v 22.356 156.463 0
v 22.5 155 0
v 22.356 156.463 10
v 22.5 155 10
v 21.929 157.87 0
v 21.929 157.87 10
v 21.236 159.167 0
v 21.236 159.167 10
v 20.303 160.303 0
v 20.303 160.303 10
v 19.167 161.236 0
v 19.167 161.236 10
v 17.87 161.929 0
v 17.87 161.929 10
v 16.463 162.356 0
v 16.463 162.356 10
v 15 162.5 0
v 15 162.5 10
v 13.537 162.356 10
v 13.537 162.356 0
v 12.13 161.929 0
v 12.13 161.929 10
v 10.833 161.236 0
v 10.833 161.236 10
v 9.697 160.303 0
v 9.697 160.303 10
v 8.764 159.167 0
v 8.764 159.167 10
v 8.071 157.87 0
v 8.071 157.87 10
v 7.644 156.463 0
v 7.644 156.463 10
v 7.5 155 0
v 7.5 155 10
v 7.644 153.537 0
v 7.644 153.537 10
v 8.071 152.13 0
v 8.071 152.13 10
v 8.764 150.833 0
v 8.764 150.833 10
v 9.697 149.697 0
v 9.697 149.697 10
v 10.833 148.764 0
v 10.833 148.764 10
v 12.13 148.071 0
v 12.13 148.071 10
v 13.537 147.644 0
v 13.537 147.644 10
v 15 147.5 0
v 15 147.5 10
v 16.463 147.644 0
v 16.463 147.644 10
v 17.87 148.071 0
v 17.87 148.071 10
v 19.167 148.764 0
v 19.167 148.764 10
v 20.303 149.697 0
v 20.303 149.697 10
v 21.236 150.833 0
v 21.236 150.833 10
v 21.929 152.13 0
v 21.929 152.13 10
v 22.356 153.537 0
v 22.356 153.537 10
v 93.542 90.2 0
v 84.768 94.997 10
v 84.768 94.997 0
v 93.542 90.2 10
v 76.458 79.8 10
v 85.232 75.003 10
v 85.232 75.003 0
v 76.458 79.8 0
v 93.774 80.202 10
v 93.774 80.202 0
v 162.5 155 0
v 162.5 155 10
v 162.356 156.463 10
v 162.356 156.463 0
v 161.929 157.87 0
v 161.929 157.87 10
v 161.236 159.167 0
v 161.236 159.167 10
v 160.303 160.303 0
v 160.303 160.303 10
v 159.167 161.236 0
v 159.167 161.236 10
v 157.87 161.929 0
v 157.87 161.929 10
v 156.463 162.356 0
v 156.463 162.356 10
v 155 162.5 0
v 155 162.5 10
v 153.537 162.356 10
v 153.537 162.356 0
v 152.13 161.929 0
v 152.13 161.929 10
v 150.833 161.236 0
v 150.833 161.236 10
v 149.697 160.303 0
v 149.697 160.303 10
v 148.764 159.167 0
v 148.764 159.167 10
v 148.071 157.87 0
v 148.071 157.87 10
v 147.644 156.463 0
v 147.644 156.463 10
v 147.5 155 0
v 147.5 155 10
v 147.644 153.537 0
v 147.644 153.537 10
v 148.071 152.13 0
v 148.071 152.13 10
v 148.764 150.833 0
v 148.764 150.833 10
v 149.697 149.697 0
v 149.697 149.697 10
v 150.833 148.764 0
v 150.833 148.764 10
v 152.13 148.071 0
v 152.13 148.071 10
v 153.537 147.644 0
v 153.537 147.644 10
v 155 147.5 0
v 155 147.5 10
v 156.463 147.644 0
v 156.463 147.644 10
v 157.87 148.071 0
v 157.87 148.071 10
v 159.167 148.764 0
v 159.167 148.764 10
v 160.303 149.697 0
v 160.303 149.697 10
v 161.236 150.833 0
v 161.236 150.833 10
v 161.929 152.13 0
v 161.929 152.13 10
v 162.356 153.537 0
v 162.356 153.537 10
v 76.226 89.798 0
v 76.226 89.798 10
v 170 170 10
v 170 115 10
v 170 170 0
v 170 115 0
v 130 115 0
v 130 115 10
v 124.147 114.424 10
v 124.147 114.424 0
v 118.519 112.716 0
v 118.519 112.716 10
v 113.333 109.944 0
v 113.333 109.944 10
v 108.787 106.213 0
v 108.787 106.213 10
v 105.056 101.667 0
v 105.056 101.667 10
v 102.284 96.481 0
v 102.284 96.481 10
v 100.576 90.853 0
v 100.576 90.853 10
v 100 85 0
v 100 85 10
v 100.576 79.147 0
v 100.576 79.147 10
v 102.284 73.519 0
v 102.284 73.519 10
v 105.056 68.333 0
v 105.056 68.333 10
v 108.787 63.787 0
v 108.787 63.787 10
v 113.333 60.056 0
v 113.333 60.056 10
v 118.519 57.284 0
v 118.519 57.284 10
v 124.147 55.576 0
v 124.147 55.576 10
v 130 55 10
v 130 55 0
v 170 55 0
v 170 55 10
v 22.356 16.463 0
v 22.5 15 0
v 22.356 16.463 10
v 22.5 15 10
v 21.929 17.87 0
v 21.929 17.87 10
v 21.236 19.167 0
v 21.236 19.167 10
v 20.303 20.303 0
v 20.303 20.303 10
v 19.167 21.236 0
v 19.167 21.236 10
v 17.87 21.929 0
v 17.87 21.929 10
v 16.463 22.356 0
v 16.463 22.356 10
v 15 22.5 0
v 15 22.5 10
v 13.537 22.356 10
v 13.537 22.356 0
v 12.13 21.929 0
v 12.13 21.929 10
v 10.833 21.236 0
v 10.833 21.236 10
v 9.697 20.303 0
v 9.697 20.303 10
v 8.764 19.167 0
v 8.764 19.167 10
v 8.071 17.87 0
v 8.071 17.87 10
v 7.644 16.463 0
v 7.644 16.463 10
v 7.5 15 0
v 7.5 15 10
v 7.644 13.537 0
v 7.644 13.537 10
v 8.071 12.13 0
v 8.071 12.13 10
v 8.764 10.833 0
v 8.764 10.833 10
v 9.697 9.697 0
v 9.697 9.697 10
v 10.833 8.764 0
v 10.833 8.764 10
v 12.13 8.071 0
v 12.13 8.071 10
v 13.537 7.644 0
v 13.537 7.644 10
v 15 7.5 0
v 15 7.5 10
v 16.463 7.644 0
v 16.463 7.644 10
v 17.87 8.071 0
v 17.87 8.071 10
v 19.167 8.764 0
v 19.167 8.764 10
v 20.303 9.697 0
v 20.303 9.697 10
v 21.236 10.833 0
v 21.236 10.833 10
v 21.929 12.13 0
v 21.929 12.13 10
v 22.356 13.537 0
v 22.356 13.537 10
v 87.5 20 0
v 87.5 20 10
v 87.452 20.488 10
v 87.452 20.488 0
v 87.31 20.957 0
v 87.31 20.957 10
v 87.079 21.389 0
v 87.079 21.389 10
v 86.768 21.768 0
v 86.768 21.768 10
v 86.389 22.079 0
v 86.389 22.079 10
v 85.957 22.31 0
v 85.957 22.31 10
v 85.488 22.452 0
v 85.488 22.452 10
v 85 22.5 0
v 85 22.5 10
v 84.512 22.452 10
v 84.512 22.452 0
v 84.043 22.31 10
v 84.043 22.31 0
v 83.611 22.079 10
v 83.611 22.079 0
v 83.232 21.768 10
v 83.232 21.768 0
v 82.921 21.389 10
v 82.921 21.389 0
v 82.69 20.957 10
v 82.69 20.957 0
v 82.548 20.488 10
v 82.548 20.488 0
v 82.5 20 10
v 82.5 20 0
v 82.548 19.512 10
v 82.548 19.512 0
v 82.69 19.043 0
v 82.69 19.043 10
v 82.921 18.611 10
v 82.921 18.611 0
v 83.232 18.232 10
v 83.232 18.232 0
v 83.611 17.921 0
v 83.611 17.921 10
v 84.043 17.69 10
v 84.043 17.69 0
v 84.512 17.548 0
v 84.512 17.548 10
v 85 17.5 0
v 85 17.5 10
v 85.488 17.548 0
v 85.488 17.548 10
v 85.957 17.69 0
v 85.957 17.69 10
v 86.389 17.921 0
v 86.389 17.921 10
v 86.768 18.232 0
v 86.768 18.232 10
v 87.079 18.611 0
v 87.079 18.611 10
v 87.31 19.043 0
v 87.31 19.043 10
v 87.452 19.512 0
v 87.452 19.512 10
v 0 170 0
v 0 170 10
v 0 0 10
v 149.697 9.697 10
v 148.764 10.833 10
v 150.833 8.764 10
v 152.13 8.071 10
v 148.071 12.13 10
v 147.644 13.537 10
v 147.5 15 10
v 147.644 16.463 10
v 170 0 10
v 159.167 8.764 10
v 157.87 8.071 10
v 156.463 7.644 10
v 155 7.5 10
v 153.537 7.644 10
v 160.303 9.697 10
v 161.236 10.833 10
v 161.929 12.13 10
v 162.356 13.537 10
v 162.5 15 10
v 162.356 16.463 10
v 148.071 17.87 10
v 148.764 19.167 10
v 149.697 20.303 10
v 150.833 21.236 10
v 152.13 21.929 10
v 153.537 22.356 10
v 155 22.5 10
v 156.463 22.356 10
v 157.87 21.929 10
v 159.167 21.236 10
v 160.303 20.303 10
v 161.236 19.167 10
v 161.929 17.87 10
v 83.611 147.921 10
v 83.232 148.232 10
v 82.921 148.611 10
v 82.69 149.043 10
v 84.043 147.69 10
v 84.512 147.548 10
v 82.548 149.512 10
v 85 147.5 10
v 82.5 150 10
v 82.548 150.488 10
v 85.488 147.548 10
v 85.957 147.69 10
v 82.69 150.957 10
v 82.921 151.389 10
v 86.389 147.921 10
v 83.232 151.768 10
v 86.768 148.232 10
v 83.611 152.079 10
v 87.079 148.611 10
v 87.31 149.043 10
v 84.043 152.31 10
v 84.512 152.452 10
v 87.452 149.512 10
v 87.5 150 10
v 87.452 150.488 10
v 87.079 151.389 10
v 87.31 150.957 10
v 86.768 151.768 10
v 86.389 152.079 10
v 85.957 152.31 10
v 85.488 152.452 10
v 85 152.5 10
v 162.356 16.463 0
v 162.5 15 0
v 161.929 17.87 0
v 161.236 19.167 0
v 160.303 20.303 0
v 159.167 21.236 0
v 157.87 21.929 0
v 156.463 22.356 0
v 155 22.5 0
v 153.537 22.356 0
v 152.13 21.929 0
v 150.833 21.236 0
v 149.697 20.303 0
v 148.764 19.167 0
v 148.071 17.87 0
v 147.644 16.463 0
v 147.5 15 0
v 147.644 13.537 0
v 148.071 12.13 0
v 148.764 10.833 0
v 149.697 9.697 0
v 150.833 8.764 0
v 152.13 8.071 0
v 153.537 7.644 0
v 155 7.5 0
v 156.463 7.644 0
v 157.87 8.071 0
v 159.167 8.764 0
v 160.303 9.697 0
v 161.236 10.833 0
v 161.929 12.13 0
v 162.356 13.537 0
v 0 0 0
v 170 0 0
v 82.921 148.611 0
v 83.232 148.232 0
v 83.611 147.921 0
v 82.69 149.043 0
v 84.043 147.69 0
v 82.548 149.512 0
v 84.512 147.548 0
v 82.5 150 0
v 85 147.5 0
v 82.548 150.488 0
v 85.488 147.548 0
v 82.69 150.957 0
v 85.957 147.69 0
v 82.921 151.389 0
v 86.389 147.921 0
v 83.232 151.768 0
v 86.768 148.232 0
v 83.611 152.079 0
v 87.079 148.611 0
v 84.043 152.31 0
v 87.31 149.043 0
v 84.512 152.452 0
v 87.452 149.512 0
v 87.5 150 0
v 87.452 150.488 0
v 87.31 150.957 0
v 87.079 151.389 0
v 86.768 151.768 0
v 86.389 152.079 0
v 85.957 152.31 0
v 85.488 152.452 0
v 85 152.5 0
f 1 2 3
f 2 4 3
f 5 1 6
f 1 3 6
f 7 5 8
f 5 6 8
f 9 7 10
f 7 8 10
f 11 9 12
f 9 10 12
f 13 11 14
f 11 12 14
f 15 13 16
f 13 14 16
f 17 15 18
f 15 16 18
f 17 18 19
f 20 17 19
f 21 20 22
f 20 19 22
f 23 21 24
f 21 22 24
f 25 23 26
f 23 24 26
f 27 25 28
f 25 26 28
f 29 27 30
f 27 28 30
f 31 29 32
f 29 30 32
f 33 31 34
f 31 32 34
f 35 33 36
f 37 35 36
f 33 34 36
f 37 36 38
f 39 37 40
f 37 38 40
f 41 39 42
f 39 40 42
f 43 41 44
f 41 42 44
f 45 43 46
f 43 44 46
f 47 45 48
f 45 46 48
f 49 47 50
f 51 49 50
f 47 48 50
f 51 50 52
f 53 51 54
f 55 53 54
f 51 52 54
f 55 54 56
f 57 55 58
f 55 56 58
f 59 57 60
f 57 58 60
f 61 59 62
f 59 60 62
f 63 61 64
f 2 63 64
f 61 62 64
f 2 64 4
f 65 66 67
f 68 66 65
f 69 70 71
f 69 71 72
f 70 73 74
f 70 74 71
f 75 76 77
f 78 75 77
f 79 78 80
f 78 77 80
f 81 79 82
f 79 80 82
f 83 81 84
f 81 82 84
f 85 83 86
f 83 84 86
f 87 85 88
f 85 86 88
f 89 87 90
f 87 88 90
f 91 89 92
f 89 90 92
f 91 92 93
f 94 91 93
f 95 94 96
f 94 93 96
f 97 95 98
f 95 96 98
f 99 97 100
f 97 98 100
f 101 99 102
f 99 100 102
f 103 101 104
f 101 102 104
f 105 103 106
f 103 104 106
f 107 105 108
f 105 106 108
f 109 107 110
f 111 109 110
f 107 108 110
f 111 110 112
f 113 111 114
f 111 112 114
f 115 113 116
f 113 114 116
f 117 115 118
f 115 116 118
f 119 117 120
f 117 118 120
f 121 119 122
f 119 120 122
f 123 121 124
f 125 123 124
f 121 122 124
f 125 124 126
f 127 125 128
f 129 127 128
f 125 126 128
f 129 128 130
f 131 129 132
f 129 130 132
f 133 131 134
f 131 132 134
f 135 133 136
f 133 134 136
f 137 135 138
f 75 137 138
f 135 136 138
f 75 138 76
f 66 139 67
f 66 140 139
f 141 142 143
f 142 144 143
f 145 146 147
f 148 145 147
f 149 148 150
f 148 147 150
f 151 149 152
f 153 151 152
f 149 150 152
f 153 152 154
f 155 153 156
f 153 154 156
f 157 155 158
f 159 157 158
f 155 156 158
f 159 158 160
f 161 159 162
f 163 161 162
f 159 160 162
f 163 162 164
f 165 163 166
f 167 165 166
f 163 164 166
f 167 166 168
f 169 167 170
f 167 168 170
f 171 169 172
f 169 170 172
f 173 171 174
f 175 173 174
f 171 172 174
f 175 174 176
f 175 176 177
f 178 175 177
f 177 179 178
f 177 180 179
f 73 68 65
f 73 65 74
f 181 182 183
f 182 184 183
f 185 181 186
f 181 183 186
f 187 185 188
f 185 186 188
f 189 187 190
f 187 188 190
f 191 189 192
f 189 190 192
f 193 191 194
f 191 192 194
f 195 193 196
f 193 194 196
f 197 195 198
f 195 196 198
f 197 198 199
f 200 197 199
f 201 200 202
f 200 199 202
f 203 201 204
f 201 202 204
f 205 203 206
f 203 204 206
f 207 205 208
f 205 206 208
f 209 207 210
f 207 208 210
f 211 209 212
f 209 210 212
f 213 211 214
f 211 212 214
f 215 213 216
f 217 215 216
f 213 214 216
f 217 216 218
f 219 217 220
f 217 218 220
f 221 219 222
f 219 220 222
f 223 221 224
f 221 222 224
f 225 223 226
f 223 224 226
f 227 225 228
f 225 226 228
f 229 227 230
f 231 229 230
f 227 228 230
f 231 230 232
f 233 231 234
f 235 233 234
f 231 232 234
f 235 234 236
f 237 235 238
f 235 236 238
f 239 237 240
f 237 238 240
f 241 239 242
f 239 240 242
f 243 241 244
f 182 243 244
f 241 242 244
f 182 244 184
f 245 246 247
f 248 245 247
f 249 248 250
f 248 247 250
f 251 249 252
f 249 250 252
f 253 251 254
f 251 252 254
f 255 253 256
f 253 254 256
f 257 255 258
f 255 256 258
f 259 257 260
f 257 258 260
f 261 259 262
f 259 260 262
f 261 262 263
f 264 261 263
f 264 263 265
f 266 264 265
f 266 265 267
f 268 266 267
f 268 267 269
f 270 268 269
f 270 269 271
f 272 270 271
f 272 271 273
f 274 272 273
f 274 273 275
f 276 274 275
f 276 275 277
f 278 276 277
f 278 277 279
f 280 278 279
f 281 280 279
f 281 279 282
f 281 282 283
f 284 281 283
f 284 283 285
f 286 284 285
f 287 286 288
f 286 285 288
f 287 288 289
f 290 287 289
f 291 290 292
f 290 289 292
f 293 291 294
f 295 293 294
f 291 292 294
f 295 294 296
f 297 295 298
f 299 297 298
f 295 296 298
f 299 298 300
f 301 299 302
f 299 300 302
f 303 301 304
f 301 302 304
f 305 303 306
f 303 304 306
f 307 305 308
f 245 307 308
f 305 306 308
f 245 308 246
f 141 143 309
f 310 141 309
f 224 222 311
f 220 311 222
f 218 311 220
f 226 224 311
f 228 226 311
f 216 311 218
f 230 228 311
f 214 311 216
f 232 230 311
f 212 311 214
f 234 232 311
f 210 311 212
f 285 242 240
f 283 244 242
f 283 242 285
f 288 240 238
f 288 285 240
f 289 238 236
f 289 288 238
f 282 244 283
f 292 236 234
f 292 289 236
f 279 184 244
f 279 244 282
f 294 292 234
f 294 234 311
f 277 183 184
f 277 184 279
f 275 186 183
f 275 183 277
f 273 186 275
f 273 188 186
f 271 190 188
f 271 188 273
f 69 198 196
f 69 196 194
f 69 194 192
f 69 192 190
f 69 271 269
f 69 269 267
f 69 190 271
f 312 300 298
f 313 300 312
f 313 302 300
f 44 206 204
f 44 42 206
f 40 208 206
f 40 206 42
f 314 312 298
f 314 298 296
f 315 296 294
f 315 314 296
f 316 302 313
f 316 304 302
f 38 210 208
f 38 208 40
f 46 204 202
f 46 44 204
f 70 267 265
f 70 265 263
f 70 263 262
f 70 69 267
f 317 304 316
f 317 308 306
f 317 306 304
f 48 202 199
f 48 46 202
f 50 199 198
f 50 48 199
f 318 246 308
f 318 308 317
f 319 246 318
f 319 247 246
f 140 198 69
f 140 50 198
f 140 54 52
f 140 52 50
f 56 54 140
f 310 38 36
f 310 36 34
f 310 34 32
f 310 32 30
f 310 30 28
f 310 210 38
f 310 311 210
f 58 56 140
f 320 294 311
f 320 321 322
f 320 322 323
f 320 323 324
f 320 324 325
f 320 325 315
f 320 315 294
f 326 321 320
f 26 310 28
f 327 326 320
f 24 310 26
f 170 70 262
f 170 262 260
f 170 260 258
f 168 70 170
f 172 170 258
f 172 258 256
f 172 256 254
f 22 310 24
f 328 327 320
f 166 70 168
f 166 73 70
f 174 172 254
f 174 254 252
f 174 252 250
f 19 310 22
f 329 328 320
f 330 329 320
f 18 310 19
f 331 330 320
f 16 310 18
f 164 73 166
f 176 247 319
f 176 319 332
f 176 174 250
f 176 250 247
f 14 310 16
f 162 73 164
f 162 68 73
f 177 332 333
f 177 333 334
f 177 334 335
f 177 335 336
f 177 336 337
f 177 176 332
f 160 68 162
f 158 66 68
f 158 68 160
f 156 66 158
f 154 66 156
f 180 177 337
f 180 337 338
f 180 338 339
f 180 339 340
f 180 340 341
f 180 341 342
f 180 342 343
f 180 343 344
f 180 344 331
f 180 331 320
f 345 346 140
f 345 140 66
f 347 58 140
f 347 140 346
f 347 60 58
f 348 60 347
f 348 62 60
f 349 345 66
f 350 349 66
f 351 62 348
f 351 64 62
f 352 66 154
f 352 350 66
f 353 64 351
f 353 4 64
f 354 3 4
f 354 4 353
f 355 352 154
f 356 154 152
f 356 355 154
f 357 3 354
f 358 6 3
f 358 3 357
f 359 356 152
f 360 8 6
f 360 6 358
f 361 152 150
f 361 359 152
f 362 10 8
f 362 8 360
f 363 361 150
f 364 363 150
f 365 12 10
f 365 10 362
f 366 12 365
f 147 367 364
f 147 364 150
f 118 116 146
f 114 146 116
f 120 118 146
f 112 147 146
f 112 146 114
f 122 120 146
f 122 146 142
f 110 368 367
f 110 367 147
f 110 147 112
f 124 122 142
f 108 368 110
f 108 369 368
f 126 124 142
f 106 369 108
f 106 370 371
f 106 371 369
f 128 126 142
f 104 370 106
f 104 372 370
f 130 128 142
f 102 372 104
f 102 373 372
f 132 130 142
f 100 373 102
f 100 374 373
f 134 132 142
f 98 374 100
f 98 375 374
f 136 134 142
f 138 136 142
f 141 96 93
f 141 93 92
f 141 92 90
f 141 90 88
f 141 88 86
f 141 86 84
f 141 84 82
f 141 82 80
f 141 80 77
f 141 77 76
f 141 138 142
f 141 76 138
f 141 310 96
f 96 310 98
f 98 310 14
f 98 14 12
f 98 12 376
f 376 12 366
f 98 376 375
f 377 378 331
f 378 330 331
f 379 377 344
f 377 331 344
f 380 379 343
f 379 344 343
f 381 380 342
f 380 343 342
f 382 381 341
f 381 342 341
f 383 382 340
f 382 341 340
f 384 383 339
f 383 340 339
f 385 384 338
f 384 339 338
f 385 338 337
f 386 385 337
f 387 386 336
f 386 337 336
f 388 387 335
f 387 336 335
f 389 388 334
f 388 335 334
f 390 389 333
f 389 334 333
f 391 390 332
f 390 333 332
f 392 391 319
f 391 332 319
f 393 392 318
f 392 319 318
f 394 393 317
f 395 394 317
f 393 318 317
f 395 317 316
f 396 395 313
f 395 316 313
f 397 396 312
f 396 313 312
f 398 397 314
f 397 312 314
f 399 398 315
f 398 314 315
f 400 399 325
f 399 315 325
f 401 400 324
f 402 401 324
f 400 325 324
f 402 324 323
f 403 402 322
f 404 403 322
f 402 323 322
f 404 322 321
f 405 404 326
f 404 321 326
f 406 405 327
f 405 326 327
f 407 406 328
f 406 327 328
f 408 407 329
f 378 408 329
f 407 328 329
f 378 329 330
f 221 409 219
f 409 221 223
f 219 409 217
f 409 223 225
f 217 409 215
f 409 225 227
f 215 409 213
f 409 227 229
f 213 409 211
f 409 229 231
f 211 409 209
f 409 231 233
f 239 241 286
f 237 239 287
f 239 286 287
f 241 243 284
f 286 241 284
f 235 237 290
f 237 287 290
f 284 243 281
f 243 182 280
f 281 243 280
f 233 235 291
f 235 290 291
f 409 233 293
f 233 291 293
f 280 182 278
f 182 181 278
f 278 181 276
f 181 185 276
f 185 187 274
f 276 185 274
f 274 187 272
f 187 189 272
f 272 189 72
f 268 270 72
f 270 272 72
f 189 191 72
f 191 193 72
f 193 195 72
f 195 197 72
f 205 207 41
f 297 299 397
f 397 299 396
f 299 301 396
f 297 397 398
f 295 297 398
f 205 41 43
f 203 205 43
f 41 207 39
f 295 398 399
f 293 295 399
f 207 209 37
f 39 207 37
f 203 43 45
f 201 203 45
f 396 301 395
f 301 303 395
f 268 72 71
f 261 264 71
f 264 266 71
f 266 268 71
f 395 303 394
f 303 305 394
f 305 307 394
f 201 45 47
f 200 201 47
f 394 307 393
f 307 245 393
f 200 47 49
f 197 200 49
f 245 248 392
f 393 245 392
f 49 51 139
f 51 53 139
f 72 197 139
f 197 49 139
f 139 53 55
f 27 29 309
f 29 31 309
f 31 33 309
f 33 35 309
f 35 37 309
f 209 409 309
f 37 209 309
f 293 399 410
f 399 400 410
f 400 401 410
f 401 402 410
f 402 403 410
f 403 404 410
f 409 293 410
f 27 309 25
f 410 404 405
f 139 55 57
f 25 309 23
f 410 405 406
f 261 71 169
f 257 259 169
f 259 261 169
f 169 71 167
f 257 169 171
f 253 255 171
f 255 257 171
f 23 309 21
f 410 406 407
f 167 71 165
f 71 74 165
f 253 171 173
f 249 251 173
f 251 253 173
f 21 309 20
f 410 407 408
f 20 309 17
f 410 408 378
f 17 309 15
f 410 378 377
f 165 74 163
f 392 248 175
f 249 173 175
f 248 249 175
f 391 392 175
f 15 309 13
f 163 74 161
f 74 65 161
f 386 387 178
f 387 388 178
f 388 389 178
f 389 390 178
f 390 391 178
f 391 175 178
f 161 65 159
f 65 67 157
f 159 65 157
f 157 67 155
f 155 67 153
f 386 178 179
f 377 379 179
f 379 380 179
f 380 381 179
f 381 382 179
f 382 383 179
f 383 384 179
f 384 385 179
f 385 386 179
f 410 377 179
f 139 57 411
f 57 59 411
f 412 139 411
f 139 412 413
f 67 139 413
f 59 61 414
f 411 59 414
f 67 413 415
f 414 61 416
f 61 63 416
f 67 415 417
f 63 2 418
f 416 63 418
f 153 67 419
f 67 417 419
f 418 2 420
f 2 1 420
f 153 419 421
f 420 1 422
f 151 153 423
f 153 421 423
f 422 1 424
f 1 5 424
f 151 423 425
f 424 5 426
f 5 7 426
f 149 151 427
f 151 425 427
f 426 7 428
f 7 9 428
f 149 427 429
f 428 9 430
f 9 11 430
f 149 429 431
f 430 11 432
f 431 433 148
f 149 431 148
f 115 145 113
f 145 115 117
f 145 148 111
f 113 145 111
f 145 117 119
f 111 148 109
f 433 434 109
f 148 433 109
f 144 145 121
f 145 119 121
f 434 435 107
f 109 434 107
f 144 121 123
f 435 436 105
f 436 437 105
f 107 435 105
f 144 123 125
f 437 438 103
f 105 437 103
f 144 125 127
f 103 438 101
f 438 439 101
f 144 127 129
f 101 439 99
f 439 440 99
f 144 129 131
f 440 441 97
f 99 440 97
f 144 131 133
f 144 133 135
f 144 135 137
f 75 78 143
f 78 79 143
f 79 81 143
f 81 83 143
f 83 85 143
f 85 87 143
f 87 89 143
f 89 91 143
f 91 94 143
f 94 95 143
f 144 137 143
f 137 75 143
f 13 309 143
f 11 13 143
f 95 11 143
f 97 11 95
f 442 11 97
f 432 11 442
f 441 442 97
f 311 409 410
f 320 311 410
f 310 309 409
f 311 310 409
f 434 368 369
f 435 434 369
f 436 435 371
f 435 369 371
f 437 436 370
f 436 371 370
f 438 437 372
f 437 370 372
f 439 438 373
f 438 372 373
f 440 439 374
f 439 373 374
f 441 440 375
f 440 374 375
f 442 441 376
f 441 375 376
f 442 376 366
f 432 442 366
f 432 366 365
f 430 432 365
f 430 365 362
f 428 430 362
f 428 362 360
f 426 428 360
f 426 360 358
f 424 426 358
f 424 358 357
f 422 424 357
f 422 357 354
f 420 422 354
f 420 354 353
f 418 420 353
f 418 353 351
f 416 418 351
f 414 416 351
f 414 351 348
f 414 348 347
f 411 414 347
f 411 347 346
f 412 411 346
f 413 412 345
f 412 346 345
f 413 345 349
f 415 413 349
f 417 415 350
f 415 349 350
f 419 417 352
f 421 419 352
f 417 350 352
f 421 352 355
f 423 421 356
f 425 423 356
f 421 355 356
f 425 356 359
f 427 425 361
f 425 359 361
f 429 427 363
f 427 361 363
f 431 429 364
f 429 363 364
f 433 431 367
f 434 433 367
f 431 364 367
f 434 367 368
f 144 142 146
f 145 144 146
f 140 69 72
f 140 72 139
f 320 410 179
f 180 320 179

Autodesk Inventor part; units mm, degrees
ref_plane "YZ Plane" through (0, 0, 0) normal (1, 0, 0) x (0, 1, 0)
ref_plane "XZ Plane" through (0, 0, 0) normal (0, 1, 0) x (-1, 0, 0)
ref_plane "XY Plane" through (0, 0, 0) normal (0, 0, 1) x (1, 0, 0)
sketch "Sketch1" plane through (0, 0, 0) normal (0, 0, 1) x (1, 0, 0)
  line L0 (0, 0) -> (170, 0)
  line L1 (170, 0) -> (170, 170)
  line L2 (170, 170) -> (0, 170)
  line L3 (0, 170) -> (0, 0)
  dimension "d0" = 170
  dimension "d1" = 170
extrude "Extrusion1" add sketch "Sketch1" along normal blind 10
sketch "Sketch2" plane through (0, 0, 10) normal (0, 0, 1) x (1, 0, 0)
  line L0 (170, 170) -> (0, 170) projected
  line L1 (0, 170) -> (0, 155)
  line L2 (0, 170) -> (0, 0) projected
  line L3 (0, 0) -> (170, 0) projected
  line L4 (0, 0) -> (0, 15)
  line L5 (0, 15) -> (155, 15)
  line L6 (155, 15) -> (155, 155)
  line L7 (155, 155) -> (15, 155)
  line L8 (15, 155) -> (15, 15)
  line L9 (15, 155) -> (30, 155)
  circle A0 centre (15, 155) radius 7.5
  circle A1 centre (155, 155) radius 7.5
  circle A2 centre (155, 15) radius 7.5
  circle A3 centre (15, 15) radius 7.5
  dimension "d4" = 15
  dimension "d5" = 15
  dimension "d6" = 155
  dimension "d7" = 140
  dimension "d8" = 140
  dimension "d9" = 140
  dimension "d10" = 15
  dimension "d11" = 15
  dimension "d12" = 15
  dimension "d13" = 15
extrude "Extrusion2" cut sketch "Sketch2" against normal blind 10 contours L8 A3 L5 | L5 A3 | L5 A3 L8 | A2 L6 L5 | L5 L6 A2 | A0 L7 L8 | L8 L7 A0 | A1 L7 L6 | L6 L7 A1
sketch "Sketch3" plane through (0, 0, 10) normal (0, 0, 1) x (1, 0, 0)
  line L0 (170, 170) -> (0, 170) projected
  line L1 (0, 170) -> (85, 170)
  line L2 (85, 170) -> (85, 85)
  line L3 (93.542, 90.1995) -> (93.7739, 80.2022)
  line L4 (93.7739, 80.2022) -> (85.2319, 75.0027)
  line L5 (85.2319, 75.0027) -> (76.458, 79.8005)
  line L6 (76.458, 79.8005) -> (76.2261, 89.7978)
  line L7 (76.2261, 89.7978) -> (84.7681, 94.9973)
  line L8 (84.7681, 94.9973) -> (93.542, 90.1995)
  point P0 (0, 0)
  dimension "d16" = 85
  dimension "d17" = 85
  dimension "d18" = 10
extrude "Extrusion3" cut sketch "Sketch3" against normal blind 10
sketch "Sketch4" plane through (0, 0, 10) normal (0, 0, 1) x (1, 0, 0)
  line L0 (170, 170) -> (0, 170) projected
  line L1 (0, 170) -> (85, 170)
  line L2 (85, 170) -> (85, 150)
  line L3 (85, 150) -> (85, 20)
  circle A0 centre (85, 150) radius 2.5
  circle A1 centre (85, 20) radius 2.5
  point P0 (0, 0)
  dimension "d21" = 85
  dimension "d22" = 20
  dimension "d23" = 130
  dimension "d24" = 5
  dimension "d25" = 5
extrude "Extrusion4" cut sketch "Sketch4" against normal blind 10
sketch "Sketch5" plane through (0, 0, 10) normal (0, 0, 1) x (1, 0, 0)
  line L0 (170, 170) -> (0, 170) projected
  line L1 (170, 170) -> (170, 85)
  line L2 (170, 0) -> (170, 170) projected
  point P0 (0, 0)
  dimension "d28" = 85
sketch "Sketch6" plane through (0, 0, 10) normal (0, 0, 1) x (1, 0, 0)
  line L0 (170, 0) -> (170, 170) projected
  line L1 (170, 85) -> (130, 85)
  circle A0 centre (130, 85) radius 30
  point P0 (0, 0)
  dimension "d29" = 40
  dimension "d30" = 60
extrude "Extrusion5" cut sketch "Sketch6" against normal blind 10
sketch "Sketch7" plane through (0, 0, 10) normal (0, 0, 1) x (1, 0, 0)
  line L0 (170, 0) -> (170, 170) projected
  line L1 (170, 85) -> (170, 55)
  line L2 (170, 55) -> (170, 115)
  line L3 (170, 115) -> (157, 115)
  line L4 (157, 115) -> (157, 55)
  line L5 (157, 55) -> (170, 55)
  line L6 (170, 55) -> (170, 115)
  point P0 (0, 0)
  dimension "d33" = 30
  dimension "d34" = 60
extrude "Extrusion6" cut sketch "Sketch7" against normal blind 10
sketch "Sketch8" plane through (0, 0, 10) normal (0, 0, 1) x (1, 0, 0)
  line L0 (157, 55) -> (157, 71.9233) projected
  line L1 (157, 55) -> (138, 55)
  line L2 (138, 55) -> (130, 55)
  arc A0 (157, 98.0767) -> (157, 71.9233) centre (130, 85) ccw projected
  point P0 (0, 0)
extrude "Extrusion7" cut sketch "Sketch8" against normal blind 10
sketch "Sketch9" plane through (0, 0, 10) normal (0, 0, 1) x (1, 0, 0)
  line L0 (157, 115) -> (157, 98.0767) projected
  line L1 (157, 115) -> (130, 115)
  arc A0 (157, 98.0767) -> (130, 55) centre (130, 85) ccw projected
  point P0 (0, 0)
extrude "Extrusion8" cut sketch "Sketch9" against normal blind 10
properties part number "AC"
